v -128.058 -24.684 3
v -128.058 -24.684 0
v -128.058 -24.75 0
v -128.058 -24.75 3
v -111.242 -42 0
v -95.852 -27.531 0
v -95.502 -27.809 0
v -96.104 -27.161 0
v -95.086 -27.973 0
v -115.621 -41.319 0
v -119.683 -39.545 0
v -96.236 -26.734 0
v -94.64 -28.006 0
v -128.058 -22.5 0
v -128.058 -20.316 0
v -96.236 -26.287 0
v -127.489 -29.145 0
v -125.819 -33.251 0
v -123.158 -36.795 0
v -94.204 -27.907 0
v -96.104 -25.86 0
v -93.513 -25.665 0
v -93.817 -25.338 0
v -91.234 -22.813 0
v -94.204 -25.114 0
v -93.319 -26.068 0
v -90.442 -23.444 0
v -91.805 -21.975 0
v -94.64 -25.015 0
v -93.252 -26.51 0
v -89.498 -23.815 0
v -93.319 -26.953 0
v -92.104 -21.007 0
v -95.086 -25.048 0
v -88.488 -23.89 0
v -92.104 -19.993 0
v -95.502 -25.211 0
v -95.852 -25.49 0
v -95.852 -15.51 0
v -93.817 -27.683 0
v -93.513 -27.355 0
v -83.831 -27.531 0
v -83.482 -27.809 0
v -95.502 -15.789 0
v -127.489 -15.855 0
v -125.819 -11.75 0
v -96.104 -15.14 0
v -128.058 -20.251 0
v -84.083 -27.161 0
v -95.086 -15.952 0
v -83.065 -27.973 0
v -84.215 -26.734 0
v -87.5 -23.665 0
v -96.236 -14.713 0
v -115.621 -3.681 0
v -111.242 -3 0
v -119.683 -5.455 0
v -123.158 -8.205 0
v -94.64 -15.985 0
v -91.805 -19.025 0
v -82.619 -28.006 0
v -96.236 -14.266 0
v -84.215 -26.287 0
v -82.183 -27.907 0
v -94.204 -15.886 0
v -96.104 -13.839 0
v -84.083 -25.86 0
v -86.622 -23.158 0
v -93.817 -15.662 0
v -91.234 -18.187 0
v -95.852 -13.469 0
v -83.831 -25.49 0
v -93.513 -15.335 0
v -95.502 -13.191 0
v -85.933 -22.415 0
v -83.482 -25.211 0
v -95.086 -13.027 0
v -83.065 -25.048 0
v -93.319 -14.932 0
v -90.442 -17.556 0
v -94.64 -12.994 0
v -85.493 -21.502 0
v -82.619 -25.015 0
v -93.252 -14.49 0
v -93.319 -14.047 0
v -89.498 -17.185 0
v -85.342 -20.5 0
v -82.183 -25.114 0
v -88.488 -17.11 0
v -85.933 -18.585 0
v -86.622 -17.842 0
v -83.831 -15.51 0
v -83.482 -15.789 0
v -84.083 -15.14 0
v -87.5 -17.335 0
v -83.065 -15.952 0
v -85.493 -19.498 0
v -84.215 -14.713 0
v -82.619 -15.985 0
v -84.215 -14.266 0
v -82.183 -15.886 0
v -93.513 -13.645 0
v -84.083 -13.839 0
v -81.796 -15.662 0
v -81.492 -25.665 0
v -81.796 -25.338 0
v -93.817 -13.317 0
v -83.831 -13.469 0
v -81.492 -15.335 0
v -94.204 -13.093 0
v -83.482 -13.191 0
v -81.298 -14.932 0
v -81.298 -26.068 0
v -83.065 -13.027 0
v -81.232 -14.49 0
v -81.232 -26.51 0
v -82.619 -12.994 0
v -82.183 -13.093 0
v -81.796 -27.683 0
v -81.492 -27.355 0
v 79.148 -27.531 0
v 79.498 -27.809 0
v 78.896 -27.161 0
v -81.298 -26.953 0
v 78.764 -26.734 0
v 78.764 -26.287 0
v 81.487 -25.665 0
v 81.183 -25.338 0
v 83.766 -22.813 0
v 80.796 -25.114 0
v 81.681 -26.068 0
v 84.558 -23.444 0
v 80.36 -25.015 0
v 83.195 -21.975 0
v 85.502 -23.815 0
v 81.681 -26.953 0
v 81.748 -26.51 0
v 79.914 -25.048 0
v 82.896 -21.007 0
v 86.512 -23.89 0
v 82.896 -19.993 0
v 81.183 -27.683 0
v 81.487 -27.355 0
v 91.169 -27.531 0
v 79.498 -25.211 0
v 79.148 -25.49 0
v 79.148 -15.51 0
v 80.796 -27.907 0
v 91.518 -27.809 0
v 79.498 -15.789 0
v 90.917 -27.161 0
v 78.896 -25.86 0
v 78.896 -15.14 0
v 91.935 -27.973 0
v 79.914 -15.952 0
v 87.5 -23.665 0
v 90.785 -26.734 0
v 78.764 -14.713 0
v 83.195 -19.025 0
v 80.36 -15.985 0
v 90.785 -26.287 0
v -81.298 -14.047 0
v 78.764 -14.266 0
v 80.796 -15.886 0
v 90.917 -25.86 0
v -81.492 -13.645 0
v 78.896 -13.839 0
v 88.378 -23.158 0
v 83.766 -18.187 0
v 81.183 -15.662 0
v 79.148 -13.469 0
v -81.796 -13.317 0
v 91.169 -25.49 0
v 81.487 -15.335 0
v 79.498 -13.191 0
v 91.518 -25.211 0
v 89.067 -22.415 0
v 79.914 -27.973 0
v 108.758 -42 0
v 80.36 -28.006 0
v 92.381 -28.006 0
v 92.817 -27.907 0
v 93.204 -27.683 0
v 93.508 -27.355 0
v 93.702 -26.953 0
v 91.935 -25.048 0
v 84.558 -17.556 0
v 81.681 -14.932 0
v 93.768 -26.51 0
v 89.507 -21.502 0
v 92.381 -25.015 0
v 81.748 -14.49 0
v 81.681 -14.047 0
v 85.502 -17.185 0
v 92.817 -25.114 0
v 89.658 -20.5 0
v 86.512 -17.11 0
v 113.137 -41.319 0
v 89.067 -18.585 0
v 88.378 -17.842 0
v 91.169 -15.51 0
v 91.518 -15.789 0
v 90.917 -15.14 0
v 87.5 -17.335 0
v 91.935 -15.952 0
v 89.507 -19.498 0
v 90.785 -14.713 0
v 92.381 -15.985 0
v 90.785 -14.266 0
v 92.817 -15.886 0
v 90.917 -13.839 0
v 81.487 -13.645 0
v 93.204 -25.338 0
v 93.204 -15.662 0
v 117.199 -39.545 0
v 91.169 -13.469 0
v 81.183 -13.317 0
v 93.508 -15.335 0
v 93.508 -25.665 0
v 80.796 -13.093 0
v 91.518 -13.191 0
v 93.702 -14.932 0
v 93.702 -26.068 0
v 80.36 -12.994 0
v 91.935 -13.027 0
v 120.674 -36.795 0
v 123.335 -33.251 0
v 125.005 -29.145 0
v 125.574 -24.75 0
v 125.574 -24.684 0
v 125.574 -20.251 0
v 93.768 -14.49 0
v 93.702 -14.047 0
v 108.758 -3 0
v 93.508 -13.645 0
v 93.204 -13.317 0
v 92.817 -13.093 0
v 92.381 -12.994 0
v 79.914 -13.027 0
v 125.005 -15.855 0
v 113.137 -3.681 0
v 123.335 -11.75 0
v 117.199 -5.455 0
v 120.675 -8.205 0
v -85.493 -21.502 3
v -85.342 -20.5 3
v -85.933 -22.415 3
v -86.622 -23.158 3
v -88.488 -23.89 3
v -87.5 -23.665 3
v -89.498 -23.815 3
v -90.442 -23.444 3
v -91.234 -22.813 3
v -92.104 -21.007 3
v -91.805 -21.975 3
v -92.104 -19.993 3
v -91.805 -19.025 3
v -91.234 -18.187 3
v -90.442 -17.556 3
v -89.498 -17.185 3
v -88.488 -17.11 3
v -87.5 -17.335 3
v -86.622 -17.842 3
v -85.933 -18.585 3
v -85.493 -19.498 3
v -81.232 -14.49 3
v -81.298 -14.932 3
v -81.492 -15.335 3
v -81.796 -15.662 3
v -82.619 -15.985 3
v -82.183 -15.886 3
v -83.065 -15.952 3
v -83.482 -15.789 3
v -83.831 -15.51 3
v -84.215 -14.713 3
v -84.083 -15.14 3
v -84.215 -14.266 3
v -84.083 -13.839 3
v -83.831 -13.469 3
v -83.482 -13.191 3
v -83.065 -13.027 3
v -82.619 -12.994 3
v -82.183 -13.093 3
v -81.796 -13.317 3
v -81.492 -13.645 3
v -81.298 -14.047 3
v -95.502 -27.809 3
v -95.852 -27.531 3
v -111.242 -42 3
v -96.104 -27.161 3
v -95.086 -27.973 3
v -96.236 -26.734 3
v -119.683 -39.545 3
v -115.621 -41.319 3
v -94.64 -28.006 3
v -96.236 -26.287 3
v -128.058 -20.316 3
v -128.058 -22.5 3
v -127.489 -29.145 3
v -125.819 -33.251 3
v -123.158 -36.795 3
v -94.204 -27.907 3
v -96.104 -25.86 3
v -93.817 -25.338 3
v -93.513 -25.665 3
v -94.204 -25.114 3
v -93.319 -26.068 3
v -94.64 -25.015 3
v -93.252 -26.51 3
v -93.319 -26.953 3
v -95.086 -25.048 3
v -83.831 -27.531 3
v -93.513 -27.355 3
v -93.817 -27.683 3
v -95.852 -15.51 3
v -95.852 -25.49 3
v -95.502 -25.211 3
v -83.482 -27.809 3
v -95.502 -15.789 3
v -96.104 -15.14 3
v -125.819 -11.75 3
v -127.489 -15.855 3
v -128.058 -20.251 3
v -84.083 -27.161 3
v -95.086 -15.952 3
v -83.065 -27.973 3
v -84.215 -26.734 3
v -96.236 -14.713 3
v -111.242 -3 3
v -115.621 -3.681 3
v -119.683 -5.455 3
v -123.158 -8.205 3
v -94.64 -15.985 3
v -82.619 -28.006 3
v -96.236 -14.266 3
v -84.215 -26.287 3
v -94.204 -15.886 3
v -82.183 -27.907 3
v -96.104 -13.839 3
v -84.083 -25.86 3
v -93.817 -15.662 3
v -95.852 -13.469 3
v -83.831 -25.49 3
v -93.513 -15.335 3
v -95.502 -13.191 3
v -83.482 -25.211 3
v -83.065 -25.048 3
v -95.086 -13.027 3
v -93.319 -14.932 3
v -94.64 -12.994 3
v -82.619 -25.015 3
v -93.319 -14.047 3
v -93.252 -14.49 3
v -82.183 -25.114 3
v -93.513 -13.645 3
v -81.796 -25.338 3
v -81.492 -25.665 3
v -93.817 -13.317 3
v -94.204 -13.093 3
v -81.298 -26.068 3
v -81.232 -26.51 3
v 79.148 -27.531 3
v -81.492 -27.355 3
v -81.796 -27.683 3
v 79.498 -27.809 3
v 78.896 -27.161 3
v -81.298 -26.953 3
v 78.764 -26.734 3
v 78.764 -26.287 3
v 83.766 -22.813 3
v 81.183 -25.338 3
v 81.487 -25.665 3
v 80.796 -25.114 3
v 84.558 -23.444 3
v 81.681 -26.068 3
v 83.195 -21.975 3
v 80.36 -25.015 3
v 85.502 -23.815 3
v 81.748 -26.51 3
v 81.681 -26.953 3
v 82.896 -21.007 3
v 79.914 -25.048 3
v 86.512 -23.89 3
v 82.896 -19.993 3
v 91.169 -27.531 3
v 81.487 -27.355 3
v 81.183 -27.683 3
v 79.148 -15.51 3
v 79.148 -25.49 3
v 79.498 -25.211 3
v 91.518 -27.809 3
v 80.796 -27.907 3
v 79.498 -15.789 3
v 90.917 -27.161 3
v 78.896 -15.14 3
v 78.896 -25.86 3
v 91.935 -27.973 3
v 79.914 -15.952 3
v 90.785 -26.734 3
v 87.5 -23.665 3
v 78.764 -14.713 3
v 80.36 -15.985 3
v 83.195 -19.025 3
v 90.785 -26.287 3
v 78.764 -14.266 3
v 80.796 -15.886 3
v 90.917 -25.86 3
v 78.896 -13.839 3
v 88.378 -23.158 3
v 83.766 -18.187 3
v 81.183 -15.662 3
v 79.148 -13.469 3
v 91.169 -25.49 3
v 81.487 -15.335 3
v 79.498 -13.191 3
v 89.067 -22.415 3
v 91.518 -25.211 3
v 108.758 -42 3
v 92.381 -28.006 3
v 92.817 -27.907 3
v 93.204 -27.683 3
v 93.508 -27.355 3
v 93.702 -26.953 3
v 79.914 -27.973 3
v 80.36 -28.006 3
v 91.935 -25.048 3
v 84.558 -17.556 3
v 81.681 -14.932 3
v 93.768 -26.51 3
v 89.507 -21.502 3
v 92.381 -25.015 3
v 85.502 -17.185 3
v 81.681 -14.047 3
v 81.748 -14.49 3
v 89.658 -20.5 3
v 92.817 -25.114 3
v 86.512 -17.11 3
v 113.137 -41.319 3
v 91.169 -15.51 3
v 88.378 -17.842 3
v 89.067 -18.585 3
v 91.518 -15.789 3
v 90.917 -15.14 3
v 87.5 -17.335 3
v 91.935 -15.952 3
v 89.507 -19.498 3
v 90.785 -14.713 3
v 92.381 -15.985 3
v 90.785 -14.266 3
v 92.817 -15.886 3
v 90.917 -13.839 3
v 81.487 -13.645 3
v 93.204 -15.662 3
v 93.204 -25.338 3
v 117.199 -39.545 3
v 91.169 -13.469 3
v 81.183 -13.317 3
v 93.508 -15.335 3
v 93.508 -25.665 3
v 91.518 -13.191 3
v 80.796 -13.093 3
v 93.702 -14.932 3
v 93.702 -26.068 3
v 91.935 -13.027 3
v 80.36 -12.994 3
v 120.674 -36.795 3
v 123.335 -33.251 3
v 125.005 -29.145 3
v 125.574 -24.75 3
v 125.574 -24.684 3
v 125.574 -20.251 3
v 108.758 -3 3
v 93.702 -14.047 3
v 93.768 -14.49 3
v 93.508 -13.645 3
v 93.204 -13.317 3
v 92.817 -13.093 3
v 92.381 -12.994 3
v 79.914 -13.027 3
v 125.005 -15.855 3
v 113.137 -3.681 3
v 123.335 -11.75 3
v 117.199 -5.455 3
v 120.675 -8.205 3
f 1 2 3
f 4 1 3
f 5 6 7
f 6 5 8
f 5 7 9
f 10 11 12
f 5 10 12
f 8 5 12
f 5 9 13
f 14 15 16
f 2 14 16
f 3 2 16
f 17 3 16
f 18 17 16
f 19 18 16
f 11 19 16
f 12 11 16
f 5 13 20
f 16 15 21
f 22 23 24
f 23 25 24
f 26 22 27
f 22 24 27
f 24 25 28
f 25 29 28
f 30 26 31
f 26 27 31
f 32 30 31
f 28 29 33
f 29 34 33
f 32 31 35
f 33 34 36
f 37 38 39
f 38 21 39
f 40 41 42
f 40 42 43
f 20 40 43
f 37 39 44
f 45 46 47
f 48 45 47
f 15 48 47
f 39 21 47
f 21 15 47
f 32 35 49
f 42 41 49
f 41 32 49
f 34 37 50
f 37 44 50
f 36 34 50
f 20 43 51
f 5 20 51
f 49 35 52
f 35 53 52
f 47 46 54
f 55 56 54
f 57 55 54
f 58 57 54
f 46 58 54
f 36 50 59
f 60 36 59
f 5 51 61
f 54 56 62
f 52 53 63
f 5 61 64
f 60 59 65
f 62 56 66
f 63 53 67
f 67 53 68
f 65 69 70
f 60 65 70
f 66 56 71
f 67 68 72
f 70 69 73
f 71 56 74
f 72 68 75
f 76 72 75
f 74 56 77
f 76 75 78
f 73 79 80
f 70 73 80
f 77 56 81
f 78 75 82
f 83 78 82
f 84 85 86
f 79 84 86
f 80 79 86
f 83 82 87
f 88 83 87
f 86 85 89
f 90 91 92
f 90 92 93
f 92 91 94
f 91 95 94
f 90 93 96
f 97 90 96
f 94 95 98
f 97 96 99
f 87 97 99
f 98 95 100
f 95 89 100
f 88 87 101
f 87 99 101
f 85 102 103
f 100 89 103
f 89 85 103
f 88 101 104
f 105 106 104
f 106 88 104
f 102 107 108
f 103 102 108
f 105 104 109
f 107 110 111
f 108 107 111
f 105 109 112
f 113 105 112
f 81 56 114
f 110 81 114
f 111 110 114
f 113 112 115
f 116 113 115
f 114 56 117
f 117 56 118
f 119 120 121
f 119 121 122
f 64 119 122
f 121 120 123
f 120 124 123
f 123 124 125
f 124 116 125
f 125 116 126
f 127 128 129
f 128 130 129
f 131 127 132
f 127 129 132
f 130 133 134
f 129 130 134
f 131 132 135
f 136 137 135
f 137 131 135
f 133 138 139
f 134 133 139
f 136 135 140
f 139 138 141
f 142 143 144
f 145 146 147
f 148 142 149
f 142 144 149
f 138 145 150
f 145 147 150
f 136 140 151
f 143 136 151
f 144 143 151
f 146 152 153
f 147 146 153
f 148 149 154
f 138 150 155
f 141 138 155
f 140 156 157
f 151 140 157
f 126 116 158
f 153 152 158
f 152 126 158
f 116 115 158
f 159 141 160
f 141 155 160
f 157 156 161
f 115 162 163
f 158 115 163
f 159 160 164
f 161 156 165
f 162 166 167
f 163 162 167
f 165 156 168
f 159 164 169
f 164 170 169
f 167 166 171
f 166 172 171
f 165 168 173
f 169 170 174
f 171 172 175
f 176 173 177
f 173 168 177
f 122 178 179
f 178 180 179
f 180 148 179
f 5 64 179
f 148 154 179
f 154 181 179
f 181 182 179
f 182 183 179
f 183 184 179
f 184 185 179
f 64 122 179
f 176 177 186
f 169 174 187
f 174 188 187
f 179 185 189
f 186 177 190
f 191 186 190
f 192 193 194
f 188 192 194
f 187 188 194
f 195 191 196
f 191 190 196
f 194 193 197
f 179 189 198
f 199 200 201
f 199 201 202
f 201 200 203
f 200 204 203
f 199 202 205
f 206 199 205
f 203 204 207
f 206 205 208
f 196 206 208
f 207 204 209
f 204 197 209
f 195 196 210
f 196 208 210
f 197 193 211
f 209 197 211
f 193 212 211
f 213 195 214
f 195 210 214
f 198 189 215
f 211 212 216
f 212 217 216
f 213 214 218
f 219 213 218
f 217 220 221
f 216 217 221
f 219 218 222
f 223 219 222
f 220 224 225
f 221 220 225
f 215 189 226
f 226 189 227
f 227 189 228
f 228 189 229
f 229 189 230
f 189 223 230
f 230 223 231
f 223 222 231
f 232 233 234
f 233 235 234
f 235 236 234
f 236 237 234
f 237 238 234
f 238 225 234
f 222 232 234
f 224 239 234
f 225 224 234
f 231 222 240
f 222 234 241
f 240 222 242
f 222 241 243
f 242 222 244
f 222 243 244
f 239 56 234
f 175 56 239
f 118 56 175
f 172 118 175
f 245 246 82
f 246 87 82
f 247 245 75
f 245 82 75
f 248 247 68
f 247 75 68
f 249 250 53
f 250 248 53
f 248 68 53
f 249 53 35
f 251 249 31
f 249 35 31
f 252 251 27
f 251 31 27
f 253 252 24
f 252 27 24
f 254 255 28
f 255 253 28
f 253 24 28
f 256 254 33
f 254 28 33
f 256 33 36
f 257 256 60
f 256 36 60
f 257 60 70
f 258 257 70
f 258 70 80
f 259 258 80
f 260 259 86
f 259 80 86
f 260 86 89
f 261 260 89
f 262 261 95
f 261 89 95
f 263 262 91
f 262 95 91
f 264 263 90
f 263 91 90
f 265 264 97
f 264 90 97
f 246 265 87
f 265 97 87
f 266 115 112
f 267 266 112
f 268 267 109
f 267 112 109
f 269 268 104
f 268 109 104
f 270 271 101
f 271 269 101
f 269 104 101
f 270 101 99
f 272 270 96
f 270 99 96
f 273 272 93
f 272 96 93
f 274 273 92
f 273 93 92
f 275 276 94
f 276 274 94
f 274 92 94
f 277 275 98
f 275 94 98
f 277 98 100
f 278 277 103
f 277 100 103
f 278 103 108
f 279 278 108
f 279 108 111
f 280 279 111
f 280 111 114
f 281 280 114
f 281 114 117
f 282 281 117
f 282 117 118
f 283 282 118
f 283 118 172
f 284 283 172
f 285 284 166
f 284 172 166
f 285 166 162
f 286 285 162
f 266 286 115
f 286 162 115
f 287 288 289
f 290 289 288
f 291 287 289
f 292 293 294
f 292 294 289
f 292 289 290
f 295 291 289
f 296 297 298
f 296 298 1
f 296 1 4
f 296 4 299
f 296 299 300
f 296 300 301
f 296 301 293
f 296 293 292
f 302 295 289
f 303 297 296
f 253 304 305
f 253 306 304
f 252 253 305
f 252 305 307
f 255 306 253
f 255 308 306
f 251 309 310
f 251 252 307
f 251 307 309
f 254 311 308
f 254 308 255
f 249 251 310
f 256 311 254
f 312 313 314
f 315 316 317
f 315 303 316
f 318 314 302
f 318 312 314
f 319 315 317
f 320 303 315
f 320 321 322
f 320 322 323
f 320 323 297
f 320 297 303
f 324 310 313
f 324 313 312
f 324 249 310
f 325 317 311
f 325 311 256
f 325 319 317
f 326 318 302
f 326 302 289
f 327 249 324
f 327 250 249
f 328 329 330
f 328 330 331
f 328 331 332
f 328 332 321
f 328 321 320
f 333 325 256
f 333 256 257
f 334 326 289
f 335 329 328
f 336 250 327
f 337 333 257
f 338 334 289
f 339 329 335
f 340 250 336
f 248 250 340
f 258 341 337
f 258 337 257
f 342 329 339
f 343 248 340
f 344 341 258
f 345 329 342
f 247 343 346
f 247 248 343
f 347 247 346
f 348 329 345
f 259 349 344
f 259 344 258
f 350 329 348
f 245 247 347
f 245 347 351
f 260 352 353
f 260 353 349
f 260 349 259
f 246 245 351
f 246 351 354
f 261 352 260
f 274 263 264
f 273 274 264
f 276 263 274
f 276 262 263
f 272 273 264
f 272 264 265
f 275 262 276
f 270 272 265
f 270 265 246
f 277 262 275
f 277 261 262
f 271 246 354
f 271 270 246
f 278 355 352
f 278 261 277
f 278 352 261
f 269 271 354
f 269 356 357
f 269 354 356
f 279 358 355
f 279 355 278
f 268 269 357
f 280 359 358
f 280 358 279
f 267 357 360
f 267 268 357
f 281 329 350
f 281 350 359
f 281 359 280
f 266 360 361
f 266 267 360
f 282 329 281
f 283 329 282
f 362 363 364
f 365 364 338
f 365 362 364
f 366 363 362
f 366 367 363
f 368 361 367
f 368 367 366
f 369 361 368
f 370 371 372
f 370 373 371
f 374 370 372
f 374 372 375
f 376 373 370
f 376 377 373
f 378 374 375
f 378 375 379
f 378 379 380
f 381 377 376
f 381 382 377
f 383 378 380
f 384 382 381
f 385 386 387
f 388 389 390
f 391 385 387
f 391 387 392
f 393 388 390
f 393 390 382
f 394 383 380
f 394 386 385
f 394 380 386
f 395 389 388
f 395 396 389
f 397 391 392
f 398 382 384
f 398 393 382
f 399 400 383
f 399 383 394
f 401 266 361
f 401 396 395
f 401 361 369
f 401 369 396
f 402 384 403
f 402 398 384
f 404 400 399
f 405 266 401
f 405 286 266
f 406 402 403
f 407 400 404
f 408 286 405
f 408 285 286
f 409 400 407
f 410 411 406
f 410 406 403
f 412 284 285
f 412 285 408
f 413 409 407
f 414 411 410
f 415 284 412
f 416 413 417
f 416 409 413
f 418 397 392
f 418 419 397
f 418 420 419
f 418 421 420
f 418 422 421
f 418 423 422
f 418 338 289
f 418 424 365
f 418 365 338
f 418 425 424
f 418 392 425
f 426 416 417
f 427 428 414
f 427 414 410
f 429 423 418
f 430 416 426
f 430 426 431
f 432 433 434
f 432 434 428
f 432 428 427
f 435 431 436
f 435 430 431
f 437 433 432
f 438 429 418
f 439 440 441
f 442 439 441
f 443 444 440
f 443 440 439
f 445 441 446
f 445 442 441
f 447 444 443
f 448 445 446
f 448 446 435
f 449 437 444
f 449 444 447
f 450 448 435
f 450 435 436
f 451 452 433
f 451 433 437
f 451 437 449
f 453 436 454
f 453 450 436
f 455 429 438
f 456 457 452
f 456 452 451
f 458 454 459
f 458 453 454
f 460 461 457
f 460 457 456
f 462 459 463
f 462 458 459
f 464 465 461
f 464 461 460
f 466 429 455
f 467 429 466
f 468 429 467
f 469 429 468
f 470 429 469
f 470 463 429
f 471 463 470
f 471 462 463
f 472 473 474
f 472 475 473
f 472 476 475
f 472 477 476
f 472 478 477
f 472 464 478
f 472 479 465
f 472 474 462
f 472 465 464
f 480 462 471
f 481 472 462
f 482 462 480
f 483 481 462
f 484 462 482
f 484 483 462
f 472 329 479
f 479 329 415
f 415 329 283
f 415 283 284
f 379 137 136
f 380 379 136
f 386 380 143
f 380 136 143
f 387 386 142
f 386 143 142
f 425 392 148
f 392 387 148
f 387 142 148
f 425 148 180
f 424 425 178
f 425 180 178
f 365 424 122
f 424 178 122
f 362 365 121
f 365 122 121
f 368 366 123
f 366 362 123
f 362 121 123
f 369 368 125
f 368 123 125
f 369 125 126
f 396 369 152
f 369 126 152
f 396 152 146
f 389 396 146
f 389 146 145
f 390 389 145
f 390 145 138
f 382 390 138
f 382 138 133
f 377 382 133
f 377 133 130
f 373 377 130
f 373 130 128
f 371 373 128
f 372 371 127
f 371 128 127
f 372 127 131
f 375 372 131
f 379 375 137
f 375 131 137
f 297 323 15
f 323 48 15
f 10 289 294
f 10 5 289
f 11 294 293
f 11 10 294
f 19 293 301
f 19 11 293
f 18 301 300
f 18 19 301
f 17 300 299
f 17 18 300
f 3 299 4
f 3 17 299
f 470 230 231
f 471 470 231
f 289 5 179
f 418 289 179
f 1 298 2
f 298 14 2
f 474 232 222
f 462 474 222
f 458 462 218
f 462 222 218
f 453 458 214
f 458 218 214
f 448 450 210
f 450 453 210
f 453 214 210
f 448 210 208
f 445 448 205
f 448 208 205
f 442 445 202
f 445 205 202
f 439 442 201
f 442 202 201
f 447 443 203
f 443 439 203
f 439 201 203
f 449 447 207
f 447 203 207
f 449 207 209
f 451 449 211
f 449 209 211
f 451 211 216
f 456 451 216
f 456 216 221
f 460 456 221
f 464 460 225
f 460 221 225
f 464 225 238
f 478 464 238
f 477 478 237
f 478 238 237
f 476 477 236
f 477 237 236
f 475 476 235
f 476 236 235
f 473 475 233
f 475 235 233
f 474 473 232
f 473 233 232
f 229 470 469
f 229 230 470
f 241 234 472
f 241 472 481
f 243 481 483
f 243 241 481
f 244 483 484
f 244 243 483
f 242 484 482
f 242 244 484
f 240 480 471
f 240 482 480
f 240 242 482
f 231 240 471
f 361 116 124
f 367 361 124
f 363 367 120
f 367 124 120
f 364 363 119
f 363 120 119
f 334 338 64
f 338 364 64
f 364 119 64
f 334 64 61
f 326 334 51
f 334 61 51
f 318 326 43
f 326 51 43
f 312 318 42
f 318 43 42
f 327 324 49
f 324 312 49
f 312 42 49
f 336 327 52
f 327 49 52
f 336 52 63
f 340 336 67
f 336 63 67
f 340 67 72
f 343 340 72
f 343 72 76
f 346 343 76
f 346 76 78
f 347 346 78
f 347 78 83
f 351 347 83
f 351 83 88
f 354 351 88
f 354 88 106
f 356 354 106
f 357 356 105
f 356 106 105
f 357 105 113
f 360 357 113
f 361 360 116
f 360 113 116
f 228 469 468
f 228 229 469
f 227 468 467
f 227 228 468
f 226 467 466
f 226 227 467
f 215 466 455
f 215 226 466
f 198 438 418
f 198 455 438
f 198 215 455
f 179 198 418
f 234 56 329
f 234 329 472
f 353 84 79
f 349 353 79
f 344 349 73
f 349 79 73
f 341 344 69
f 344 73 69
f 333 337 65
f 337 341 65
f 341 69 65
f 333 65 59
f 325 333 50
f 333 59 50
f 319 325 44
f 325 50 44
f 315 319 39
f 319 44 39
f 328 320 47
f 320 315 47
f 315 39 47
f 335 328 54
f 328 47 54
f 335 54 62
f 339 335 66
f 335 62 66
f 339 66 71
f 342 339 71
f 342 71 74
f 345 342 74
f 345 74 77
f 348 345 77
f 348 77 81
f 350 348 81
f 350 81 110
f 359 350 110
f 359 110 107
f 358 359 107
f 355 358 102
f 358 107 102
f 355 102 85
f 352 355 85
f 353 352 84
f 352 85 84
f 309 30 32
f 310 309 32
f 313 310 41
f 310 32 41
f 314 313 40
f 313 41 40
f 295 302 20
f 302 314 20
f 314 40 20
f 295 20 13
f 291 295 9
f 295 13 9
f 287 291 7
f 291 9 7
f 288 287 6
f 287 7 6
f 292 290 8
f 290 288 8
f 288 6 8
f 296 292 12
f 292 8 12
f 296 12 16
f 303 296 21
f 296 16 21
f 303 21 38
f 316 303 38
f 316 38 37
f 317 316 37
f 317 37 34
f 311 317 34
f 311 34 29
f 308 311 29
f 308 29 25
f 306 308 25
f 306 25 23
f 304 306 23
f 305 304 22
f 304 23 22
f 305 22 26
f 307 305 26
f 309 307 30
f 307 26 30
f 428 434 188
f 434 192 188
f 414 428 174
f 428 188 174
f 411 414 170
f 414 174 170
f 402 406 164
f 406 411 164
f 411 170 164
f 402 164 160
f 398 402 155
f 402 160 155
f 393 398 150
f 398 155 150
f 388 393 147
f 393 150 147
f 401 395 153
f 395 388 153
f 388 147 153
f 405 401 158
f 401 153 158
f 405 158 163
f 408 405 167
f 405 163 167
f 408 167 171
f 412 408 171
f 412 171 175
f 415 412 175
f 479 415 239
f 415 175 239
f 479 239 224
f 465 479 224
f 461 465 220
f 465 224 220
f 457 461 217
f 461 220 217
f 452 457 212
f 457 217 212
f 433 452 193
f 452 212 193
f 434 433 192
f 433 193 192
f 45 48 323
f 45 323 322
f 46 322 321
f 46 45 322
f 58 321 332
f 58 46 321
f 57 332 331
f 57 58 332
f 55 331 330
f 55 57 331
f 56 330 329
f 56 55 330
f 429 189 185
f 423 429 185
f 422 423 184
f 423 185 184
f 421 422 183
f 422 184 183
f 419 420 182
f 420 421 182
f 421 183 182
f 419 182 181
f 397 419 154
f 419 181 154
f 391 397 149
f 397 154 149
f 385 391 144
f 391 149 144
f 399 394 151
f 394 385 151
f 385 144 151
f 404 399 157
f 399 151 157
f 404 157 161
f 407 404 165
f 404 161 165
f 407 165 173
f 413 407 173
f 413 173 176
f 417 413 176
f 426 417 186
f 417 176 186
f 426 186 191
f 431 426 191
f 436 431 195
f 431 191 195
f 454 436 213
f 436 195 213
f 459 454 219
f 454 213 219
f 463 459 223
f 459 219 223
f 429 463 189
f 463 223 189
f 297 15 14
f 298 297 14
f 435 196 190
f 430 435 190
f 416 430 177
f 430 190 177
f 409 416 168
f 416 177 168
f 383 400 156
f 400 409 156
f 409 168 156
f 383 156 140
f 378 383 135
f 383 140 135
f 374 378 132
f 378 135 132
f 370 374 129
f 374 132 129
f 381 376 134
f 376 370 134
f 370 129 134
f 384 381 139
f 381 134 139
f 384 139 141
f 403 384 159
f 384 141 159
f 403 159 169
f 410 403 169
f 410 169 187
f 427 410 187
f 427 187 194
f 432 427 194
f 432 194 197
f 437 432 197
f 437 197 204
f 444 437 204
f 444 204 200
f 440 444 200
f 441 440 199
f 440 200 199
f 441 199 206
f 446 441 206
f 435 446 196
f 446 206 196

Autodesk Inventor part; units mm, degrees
ref_plane "YZ Plane" through (0, 0, 0) normal (1, 0, 0) x (0, 1, 0)
ref_plane "XZ Plane" through (0, 0, 0) normal (0, 1, 0) x (-1, 0, 0)
ref_plane "XY Plane" through (0, 0, 0) normal (0, 0, 1) x (1, 0, 0)
sketch "Эскиз4" plane through (0, 0, 0) normal (0, 0, 1) x (1, 0, 0)
  arc A0 (-128.0581, -24.7499) -> (-111.2416, -42.0003) centre (-110.8018, -24.7496) ccw
  arc A1 (-111.2419, -3) -> (-128.0581, -20.2507) centre (-110.8018, -20.2507) ccw
  line L0 (-128.0581, -22.5003) -> (-128.0581, -24.6843)
  line L1 (-128.0581, -20.3163) -> (-128.0581, -22.5003)
  arc A2 (108.7577, -42.0003) -> (125.5742, -24.7499) centre (108.3179, -24.7496) ccw
  line L2 (125.5743, -24.6843) -> (125.5743, -20.2507)
  arc A3 (125.5743, -20.2507) -> (108.758, -3) centre (108.318, -20.2507) ccw
  line L3 (-111.2419, -3) -> (108.7581, -3)
  line L4 (-111.2416, -42.0003) -> (108.7577, -42.0003)
  circle A4 centre (-88.7419, -20.5) radius 3.4
  circle A5 centre (-94.7523, -26.5104) radius 1.5
  circle A6 centre (-82.7315, -14.4896) radius 1.5
  circle A7 centre (-94.7523, -14.4896) radius 1.5
  circle A8 centre (-82.7315, -26.5104) radius 1.5
  circle A9 centre (86.2581, -20.5) radius 3.4
  circle A10 centre (80.2477, -26.5104) radius 1.5
  circle A11 centre (92.2685, -26.5104) radius 1.5
  circle A12 centre (92.2685, -14.4896) radius 1.5
  circle A13 centre (80.2477, -14.4896) radius 1.5
  line L5 (-128.0581, -24.6843) -> (-128.0581, -24.7499)
  line L6 (-128.0581, -20.2507) -> (-128.0581, -20.3163)
  line L7 (125.5743, -24.6843) -> (125.5742, -24.7499)
  point P0 (0, 0)
extrude "Выдавливание4" add sketch "Эскиз4" along normal blind 3
properties part number "боковая стенка"
